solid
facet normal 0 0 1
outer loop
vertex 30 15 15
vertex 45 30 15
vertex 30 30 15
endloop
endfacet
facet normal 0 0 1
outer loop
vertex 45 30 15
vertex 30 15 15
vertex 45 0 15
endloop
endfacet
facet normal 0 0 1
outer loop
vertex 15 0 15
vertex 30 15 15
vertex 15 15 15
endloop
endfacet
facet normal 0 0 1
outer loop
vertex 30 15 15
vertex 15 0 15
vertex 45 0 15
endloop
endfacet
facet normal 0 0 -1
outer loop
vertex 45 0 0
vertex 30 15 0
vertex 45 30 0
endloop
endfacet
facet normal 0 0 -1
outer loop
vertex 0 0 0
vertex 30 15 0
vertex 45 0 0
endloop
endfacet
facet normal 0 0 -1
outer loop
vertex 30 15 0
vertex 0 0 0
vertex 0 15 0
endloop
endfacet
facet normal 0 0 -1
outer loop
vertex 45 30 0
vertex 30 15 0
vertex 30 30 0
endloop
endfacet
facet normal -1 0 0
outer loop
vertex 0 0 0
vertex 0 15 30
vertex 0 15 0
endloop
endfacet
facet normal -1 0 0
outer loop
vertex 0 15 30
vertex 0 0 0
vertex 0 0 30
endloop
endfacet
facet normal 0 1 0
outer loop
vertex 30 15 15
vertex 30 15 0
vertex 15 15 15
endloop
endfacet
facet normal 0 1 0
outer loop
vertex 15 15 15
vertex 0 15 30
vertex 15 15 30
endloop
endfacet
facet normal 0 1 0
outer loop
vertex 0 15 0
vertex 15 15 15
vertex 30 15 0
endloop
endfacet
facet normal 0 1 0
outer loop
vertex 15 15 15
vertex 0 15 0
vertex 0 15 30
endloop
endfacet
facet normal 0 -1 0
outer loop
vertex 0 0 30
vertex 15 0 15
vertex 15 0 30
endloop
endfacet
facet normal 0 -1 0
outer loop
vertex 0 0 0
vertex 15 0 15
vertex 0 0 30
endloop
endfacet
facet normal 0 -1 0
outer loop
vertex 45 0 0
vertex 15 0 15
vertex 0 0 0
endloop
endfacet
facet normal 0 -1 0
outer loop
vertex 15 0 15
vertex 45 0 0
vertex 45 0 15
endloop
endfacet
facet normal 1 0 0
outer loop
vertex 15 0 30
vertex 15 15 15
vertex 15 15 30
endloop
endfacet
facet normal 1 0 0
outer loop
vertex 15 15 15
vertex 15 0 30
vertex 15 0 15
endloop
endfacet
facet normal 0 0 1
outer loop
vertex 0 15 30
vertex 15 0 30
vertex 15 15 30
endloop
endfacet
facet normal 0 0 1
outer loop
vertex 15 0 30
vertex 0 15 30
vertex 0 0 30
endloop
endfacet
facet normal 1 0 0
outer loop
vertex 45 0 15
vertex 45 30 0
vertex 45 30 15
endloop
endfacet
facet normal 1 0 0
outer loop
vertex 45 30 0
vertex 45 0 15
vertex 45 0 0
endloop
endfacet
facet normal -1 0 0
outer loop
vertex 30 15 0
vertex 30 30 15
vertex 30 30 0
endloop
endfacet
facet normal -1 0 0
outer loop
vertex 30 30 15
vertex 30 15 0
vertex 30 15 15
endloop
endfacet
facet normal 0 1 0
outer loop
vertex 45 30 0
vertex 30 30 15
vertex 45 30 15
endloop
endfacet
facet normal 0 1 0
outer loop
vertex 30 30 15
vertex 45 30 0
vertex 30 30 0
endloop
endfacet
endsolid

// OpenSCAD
// Fongo piece 2: Long hook. GPL-3.0; see README.txt.
// All cube positions derive from the canonical catalogue. z points up.
unit = 15; // mm, scale all pieces AND cards together
positions = [[0,0,0],[0,0,1],[1,0,0],[2,0,0],[2,1,0]];
union() { for (p = positions) translate(p * unit) cube([unit, unit, unit]); }
